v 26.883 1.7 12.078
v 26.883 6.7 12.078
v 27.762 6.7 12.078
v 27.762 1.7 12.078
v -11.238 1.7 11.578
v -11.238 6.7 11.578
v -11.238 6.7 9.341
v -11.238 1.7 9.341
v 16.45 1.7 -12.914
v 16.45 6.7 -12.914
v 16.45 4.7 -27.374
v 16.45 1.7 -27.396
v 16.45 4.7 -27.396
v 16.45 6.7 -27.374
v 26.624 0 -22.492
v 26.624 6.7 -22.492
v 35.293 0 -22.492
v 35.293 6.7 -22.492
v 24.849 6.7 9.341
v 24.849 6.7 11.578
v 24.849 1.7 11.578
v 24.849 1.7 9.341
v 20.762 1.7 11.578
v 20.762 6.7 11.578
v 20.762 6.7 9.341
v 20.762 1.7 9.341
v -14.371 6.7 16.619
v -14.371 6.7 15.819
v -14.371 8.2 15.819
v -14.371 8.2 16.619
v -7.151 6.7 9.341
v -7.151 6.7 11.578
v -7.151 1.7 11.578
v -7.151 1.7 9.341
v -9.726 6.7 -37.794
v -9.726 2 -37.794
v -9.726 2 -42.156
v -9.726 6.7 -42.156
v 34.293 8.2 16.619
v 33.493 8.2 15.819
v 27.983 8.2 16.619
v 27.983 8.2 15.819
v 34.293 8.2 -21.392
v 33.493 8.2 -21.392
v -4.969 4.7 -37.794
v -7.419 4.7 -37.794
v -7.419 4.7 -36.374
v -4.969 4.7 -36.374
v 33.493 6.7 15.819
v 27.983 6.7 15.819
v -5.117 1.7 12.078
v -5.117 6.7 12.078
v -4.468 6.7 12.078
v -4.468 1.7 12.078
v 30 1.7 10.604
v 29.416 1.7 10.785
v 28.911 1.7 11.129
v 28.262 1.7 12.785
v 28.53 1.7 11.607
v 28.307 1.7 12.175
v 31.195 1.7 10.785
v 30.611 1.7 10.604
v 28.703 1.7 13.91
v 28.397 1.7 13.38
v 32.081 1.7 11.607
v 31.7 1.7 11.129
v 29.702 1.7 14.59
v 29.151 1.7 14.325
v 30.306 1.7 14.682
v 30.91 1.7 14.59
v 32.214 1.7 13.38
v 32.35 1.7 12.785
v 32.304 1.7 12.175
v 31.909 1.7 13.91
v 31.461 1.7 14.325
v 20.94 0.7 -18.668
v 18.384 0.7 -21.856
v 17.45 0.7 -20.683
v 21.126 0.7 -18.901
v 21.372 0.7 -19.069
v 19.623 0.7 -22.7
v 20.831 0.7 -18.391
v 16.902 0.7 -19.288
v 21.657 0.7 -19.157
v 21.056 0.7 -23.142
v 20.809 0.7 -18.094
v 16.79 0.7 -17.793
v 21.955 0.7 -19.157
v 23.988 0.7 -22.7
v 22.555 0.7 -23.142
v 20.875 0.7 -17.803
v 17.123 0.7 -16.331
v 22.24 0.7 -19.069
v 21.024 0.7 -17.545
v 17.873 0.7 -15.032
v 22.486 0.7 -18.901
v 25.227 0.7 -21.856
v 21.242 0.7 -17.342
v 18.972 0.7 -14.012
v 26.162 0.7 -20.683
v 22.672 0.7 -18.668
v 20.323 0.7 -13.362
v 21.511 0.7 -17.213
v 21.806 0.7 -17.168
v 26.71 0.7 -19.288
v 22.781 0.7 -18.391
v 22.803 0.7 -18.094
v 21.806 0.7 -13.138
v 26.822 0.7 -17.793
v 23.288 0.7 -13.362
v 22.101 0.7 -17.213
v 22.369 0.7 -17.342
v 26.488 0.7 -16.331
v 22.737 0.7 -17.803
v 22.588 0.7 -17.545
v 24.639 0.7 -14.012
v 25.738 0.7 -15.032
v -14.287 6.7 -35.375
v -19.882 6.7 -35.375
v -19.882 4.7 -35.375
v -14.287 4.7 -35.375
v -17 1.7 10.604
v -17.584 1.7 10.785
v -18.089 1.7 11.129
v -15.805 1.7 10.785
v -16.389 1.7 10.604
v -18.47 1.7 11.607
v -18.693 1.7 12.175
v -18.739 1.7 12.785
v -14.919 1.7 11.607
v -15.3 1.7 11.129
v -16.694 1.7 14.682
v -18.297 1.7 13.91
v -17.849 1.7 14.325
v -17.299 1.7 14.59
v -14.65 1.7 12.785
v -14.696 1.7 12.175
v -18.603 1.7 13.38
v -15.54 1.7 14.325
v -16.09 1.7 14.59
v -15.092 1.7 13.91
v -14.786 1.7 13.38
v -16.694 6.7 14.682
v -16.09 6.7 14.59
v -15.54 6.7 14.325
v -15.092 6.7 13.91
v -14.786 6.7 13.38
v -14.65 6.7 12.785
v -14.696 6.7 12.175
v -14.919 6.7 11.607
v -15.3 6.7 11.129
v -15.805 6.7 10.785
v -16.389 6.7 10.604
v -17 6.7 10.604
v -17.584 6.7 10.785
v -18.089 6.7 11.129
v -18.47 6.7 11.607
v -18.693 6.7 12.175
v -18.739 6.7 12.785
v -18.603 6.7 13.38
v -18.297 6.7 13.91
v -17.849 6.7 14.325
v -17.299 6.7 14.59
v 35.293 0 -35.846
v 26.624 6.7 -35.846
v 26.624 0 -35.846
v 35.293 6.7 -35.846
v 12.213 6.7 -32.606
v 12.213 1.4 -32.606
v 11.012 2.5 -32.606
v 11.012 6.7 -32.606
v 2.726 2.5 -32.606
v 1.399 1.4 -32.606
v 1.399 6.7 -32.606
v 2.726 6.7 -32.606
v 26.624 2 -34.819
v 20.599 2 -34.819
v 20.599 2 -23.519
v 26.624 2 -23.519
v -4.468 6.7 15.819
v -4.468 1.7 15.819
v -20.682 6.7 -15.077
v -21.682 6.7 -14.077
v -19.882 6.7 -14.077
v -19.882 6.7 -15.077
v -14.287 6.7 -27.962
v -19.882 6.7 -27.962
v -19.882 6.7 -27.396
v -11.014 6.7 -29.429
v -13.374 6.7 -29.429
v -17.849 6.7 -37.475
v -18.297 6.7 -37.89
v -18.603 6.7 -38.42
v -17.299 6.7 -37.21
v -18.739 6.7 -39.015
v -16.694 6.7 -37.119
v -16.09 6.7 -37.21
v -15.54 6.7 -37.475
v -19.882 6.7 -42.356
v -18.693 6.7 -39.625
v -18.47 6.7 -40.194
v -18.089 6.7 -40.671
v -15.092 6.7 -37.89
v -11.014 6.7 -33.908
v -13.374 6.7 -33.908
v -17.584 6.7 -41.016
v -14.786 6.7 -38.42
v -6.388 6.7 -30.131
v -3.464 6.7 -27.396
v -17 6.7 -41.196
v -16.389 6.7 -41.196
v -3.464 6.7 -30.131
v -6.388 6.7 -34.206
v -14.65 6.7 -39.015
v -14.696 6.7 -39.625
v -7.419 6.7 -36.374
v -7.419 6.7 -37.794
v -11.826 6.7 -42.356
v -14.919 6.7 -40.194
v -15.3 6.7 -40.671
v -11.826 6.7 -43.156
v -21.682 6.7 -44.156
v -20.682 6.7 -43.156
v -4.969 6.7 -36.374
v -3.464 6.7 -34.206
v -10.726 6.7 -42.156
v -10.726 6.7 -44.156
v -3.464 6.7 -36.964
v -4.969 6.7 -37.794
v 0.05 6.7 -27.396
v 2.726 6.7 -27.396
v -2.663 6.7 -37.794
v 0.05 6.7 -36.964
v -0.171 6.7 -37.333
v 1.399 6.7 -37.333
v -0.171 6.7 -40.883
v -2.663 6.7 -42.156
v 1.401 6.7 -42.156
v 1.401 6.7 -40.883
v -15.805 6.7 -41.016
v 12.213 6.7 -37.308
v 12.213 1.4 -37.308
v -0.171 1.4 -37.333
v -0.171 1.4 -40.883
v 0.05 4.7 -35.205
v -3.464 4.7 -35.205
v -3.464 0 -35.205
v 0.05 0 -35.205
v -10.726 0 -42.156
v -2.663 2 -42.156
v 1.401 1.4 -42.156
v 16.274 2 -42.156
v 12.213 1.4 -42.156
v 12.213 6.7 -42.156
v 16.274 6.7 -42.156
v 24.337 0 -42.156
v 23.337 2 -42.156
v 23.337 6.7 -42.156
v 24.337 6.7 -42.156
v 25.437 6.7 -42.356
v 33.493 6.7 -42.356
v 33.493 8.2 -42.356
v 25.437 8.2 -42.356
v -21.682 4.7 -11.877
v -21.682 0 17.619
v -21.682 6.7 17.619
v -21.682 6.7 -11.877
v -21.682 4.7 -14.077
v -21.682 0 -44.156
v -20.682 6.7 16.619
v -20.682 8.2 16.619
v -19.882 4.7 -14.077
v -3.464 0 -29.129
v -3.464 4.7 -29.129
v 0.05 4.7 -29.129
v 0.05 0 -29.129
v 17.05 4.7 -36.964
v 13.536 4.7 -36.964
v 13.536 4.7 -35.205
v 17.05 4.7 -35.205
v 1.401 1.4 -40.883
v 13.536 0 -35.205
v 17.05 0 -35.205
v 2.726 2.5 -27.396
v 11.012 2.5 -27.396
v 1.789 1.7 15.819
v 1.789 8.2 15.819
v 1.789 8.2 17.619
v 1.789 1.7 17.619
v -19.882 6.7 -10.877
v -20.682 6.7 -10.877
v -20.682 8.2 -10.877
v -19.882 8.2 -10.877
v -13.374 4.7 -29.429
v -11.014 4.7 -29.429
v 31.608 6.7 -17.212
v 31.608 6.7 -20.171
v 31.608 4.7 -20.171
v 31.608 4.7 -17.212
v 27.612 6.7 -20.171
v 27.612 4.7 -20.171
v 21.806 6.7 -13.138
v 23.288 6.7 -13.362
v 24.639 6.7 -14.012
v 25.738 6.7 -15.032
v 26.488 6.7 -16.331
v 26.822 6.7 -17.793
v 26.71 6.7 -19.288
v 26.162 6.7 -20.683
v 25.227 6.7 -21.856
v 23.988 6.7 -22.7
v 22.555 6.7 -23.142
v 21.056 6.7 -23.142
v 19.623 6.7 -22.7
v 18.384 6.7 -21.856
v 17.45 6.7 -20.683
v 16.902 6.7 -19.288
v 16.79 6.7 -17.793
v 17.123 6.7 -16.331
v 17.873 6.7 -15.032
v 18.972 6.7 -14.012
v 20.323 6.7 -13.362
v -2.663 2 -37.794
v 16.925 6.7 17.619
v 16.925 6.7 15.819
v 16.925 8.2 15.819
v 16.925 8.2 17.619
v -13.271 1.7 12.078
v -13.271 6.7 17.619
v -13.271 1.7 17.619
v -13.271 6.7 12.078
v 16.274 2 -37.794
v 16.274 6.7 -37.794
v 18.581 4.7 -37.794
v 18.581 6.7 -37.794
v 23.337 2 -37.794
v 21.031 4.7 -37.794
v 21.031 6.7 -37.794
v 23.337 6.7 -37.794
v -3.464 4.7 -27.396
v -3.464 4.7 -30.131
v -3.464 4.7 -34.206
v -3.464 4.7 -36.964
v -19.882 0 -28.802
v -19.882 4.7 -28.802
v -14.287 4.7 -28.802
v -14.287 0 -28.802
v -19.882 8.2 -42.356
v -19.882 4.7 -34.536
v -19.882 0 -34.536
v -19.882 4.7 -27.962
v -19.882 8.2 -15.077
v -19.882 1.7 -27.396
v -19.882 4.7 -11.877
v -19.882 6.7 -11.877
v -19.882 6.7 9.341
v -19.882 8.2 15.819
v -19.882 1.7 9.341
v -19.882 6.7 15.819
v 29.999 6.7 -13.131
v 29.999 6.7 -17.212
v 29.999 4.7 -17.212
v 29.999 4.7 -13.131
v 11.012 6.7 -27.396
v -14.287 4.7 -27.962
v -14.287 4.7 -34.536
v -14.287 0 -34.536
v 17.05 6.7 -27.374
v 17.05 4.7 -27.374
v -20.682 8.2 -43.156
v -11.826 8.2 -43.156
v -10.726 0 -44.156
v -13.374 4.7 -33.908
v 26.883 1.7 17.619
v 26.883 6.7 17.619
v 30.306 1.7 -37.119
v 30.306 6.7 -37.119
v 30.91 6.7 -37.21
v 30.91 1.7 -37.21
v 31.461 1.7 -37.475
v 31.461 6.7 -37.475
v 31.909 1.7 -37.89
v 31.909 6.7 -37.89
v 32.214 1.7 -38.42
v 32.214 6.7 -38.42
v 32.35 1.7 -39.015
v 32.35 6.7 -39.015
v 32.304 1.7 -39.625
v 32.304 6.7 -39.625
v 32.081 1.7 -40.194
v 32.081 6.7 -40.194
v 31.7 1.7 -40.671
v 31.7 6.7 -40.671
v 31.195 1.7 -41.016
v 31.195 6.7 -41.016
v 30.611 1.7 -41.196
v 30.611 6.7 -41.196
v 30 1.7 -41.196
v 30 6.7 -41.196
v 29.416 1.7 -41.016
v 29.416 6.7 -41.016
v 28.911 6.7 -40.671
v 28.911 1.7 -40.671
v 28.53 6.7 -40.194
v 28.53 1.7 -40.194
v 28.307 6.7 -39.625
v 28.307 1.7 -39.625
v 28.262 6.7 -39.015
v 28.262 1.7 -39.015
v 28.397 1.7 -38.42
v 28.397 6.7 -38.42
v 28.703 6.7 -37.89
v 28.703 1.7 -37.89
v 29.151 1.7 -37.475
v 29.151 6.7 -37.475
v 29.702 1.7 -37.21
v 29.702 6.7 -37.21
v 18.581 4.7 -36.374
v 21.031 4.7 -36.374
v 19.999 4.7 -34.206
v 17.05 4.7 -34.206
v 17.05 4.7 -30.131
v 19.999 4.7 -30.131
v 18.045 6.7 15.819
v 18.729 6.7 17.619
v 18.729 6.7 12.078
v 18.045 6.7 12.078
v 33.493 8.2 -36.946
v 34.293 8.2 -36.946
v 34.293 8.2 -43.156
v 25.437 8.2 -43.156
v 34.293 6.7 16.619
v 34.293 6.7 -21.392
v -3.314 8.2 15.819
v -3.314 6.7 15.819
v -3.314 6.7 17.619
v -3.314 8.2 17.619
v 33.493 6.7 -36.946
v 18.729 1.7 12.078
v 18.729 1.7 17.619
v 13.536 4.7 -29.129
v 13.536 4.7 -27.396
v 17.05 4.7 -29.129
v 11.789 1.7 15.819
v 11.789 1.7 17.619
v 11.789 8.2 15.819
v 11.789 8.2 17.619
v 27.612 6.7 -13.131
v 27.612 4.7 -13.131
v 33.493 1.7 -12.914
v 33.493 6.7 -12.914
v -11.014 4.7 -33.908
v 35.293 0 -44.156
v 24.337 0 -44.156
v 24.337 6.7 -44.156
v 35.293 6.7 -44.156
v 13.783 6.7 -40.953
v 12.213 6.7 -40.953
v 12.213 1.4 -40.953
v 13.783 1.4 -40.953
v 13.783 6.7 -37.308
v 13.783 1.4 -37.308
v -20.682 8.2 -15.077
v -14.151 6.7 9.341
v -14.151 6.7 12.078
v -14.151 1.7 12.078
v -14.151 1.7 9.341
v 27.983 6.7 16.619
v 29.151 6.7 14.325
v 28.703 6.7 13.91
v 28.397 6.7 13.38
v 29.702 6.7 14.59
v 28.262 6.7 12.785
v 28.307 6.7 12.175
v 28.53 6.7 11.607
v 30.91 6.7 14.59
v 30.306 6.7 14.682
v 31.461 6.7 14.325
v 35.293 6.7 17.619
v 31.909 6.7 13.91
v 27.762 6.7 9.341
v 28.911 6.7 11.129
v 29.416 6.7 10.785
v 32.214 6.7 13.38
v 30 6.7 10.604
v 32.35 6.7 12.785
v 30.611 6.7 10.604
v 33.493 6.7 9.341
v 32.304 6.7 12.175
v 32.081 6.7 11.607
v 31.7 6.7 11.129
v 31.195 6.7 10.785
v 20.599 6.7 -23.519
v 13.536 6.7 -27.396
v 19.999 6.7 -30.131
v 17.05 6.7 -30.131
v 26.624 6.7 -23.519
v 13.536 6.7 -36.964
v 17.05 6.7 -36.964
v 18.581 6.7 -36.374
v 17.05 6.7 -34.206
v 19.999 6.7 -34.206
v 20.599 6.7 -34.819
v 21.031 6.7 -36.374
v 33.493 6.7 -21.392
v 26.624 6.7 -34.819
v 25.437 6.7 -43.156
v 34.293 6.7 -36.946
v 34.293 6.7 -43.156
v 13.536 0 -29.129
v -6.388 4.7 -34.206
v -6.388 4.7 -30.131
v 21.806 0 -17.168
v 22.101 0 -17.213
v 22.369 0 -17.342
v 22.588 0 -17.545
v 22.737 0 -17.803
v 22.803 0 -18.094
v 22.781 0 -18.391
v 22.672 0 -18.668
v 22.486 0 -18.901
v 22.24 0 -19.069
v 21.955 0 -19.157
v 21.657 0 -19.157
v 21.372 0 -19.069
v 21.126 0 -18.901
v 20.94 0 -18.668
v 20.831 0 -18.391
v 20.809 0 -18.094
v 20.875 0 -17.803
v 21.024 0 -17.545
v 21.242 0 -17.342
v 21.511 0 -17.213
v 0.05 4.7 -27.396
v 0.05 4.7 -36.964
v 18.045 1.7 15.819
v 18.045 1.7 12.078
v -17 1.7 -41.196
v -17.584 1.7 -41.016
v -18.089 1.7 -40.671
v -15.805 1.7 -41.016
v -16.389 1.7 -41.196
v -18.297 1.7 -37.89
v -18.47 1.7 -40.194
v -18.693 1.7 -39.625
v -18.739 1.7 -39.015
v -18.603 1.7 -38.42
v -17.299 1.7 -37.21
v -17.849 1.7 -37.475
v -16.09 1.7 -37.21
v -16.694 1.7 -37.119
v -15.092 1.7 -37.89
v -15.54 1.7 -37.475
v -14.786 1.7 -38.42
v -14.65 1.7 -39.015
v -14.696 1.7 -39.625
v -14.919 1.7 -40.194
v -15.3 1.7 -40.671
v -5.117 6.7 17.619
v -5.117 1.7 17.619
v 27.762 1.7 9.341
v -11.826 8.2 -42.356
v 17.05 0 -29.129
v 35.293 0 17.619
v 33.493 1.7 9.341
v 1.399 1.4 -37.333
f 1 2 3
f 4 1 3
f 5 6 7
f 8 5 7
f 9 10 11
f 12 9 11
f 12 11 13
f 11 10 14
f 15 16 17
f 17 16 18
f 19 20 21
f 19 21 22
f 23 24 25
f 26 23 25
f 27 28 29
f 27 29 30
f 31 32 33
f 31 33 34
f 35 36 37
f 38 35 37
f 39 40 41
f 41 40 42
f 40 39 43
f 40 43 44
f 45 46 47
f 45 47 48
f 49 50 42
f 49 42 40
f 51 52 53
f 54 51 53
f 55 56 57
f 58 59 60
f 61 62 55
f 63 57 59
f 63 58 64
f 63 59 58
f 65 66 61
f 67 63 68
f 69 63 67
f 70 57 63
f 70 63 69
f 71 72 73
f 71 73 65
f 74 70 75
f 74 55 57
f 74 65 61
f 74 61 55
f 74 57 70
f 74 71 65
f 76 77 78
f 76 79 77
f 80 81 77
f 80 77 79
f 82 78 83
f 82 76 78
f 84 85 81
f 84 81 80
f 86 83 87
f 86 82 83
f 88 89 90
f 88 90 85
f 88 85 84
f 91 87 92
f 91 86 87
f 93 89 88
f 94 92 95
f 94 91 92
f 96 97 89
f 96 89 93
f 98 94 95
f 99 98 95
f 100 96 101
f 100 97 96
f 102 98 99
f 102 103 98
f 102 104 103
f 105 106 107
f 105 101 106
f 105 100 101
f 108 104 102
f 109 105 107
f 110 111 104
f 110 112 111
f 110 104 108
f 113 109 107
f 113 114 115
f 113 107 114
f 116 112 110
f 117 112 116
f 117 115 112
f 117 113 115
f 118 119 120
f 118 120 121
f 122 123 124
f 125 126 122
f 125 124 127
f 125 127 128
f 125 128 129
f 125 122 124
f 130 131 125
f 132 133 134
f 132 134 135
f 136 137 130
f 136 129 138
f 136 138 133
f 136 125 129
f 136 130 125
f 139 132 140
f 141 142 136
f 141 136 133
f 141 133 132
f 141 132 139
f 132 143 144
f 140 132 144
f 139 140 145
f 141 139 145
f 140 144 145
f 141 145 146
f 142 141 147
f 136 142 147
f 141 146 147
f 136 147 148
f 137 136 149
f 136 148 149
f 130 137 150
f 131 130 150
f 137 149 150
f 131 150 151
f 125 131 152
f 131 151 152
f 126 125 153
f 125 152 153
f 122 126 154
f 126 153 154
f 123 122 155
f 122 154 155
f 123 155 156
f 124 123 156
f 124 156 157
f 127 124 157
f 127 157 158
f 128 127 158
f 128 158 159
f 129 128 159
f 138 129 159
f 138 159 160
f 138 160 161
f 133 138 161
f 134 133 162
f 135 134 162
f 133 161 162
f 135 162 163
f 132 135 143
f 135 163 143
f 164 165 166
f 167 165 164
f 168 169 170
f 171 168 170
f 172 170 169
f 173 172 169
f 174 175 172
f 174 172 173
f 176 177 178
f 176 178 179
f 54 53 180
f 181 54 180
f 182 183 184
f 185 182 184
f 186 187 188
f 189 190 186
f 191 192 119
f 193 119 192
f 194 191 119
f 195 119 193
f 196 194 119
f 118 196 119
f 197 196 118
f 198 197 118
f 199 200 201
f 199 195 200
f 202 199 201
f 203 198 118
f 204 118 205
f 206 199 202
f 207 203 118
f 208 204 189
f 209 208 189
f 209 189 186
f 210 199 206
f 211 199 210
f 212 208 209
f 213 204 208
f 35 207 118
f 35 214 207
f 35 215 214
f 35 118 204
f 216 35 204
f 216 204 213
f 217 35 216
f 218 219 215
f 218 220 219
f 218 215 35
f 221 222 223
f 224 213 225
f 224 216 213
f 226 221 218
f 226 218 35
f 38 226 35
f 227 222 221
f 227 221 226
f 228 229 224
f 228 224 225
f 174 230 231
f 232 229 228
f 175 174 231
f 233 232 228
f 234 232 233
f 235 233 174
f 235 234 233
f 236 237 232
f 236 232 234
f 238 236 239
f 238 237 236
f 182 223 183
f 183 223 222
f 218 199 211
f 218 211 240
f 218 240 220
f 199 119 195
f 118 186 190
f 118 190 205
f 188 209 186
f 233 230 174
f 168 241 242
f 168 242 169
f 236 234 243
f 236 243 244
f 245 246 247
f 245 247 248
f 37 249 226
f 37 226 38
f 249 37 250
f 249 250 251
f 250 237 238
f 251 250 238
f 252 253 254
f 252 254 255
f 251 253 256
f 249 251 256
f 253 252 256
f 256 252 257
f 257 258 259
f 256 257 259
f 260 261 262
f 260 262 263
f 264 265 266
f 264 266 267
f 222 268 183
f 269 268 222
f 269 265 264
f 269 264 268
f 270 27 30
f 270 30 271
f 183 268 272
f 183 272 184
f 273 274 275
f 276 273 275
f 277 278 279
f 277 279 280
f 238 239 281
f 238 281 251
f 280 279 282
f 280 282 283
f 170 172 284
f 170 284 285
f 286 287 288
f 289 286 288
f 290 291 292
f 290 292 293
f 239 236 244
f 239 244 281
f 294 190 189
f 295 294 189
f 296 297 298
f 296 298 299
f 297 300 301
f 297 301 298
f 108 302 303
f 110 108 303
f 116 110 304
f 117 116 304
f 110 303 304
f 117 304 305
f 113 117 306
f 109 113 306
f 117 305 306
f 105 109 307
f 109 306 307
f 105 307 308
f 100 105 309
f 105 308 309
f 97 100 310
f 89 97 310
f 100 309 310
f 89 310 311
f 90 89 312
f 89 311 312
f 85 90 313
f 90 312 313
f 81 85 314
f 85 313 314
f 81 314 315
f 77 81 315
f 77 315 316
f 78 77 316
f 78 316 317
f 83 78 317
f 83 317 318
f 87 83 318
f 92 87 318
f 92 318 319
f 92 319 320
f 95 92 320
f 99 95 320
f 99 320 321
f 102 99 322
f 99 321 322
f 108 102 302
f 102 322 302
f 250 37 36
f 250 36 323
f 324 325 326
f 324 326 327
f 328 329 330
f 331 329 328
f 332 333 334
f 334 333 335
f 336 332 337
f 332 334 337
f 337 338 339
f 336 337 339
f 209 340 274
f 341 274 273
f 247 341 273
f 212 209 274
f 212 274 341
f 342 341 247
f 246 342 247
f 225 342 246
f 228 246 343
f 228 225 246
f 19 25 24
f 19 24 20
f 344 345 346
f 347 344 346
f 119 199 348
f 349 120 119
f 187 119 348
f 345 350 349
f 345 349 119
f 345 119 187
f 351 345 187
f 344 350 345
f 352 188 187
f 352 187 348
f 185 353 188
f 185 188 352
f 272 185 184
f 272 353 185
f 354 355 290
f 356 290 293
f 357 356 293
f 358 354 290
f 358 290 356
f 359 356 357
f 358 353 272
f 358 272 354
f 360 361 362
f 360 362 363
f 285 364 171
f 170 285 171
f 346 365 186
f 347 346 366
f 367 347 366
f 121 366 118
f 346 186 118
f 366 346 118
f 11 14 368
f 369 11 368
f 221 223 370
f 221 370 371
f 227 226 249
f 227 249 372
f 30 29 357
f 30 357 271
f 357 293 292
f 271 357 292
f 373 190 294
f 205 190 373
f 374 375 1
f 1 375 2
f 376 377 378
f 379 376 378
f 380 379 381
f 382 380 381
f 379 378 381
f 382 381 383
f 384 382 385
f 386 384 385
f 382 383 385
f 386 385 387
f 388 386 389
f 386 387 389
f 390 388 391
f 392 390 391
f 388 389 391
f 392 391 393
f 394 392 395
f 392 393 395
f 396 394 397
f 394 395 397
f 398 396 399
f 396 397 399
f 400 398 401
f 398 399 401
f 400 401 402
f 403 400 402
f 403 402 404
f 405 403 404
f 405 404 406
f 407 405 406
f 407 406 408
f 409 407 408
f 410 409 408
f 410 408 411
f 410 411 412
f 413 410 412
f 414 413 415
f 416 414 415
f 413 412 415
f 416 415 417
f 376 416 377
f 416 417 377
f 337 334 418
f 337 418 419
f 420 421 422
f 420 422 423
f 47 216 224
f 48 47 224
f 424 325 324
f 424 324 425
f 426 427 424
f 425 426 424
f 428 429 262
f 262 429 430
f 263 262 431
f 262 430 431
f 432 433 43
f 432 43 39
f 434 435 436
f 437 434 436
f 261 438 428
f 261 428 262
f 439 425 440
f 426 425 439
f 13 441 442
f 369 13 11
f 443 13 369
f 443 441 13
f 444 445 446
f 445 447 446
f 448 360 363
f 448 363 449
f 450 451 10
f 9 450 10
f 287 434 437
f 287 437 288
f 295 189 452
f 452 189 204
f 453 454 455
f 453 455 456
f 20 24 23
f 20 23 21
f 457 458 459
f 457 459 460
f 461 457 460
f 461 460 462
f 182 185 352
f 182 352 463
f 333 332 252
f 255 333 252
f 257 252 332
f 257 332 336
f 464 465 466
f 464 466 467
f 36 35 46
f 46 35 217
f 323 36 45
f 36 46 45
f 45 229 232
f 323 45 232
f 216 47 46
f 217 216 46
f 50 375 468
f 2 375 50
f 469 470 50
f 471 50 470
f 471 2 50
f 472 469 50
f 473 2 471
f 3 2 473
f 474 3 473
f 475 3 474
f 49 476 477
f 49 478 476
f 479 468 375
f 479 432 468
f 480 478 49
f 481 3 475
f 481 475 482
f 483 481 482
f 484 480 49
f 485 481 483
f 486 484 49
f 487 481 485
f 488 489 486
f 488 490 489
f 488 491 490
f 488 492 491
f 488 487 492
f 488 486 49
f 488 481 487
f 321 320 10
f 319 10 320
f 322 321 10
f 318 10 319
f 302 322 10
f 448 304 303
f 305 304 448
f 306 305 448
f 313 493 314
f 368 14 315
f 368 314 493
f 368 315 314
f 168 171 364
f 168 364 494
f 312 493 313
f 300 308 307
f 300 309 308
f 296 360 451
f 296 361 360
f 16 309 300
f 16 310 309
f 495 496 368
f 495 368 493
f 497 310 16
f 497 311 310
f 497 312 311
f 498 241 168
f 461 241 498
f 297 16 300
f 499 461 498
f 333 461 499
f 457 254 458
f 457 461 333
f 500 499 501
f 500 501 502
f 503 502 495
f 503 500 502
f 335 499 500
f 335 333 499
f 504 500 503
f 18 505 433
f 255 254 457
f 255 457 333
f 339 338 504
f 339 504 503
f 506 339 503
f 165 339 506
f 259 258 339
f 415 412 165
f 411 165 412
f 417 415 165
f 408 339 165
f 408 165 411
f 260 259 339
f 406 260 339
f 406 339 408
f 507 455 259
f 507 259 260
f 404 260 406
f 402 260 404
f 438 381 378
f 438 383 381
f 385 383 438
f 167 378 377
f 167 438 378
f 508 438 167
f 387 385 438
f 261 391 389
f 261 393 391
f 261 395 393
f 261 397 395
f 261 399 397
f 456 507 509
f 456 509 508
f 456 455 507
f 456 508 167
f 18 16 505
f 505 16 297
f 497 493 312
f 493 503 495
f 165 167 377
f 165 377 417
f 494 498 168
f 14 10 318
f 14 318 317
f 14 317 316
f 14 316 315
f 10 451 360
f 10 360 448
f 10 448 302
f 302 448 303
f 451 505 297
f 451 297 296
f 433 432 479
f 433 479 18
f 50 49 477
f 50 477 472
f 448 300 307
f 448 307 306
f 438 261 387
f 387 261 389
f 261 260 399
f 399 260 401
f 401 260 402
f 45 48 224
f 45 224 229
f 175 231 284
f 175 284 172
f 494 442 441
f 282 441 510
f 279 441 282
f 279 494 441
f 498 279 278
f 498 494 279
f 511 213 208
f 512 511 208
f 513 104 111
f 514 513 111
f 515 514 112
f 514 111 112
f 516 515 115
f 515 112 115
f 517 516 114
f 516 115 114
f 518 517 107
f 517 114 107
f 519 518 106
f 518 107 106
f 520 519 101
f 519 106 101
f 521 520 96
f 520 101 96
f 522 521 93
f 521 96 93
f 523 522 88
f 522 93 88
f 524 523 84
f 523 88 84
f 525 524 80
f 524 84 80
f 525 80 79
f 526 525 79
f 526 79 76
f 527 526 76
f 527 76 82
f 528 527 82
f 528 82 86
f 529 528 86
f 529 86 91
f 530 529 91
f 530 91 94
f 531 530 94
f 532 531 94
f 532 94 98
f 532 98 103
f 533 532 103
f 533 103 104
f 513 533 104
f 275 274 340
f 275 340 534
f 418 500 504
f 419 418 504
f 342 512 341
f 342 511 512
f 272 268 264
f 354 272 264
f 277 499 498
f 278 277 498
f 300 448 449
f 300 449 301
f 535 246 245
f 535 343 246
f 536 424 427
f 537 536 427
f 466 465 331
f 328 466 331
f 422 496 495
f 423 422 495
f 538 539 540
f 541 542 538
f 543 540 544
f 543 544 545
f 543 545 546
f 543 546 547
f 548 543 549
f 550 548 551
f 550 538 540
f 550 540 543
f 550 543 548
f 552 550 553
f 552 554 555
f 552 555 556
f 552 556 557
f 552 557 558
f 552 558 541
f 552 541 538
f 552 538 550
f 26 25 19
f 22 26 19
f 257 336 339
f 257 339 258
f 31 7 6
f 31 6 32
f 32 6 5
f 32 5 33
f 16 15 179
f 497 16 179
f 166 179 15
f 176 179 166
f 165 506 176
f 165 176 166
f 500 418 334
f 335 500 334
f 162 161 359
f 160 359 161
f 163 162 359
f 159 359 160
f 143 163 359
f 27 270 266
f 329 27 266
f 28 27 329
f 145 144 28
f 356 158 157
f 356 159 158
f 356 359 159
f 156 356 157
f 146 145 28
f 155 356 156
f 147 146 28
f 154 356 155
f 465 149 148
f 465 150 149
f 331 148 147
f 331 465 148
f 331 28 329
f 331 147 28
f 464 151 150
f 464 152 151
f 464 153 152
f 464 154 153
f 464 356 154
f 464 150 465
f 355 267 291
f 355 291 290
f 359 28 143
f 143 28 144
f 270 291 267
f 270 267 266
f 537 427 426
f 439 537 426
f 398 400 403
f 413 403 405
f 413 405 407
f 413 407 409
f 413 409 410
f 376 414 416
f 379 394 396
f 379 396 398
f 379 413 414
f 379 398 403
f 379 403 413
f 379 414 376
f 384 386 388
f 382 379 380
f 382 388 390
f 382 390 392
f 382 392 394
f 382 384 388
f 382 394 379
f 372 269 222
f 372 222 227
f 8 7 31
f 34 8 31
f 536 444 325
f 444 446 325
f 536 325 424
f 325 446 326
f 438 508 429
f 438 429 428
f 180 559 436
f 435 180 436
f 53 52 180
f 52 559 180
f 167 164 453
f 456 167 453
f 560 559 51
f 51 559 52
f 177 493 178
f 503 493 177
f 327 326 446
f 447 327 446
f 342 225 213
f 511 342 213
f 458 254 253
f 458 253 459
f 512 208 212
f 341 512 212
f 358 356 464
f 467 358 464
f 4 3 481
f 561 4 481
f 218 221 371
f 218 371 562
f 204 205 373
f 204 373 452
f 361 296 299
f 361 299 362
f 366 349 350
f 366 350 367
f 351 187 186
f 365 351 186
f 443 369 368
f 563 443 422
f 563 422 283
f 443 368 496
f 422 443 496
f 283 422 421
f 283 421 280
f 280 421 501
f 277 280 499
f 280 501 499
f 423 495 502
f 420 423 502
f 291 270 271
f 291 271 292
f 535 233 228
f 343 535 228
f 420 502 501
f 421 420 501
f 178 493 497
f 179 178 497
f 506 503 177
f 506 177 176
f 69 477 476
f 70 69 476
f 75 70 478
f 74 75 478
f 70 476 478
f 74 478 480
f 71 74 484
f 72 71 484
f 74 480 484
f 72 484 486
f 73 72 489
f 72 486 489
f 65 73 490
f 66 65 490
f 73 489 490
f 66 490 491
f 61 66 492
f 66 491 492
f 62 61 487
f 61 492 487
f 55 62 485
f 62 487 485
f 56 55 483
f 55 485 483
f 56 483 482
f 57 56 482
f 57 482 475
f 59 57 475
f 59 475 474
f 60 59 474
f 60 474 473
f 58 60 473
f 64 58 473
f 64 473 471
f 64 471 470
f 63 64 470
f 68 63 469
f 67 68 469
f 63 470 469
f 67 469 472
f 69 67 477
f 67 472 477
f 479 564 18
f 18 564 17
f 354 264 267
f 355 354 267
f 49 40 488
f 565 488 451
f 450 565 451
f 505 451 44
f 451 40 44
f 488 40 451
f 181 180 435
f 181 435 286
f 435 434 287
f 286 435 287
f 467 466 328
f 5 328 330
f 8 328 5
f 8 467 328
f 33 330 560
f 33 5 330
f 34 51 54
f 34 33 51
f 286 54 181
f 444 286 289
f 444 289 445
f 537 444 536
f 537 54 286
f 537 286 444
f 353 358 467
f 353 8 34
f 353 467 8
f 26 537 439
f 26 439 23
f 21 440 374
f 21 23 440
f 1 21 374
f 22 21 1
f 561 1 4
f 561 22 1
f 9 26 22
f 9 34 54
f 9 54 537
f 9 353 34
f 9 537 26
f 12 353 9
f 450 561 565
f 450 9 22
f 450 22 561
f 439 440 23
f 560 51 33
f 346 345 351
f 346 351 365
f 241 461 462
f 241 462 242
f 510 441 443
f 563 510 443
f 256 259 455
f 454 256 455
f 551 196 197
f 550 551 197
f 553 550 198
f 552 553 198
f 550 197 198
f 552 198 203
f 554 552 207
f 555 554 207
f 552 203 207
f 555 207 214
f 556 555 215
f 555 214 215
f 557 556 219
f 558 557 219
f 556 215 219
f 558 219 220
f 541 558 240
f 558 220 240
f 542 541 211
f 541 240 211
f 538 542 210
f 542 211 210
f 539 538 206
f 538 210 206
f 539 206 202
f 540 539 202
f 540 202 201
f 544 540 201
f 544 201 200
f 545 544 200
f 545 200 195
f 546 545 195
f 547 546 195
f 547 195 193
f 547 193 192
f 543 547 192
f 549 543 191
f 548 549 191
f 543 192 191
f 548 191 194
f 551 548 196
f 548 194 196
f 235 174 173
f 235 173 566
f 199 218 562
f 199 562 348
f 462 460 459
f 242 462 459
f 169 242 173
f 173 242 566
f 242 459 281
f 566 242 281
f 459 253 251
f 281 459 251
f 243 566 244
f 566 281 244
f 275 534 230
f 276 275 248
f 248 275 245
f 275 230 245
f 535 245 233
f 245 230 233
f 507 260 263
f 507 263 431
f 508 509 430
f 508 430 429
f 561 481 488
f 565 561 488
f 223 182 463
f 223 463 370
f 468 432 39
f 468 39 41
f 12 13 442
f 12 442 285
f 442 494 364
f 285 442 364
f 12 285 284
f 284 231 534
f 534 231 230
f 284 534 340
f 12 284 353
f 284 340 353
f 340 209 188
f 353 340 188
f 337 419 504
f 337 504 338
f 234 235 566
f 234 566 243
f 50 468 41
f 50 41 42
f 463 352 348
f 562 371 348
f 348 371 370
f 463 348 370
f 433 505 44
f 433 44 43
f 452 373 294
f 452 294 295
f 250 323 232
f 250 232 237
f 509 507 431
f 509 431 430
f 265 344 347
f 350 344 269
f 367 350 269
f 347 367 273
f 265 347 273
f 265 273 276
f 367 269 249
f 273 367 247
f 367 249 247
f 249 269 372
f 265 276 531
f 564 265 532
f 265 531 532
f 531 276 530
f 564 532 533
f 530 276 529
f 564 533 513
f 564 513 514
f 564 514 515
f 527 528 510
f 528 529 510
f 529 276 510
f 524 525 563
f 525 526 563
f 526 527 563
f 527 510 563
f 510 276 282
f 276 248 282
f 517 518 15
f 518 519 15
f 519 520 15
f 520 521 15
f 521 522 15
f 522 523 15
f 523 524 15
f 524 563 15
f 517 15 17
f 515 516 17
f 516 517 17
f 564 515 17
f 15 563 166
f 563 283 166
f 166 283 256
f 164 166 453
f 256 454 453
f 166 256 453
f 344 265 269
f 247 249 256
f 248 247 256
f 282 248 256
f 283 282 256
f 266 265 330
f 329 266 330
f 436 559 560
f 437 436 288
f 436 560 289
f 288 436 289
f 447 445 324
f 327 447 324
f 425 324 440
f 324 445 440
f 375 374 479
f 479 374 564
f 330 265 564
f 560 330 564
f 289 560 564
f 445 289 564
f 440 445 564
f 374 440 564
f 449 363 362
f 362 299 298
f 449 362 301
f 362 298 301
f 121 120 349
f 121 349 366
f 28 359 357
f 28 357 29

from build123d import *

# Parameters (mm, degrees)
SKETCH_1_W           = 56.974706629
SKETCH_1_H           = 61.774716789
EXTRUDE_1_DEPTH      = 6.7
SKETCH_2_W           = 8.669316727
SKETCH_2_H           = 13.354025908
CUT_EXTRUDE_1_DEPTH  = 57.923066884
SKETCH_3_W           = 6.025008901
SKETCH_3_H           = 11.3000508
CUT_EXTRUDE_2_DEPTH  = 4.7
SKETCH_4_R           = 5.03
CUT_EXTRUDE_3_DEPTH  = 6
SKETCH_5_R           = 1
CUT_EXTRUDE_4_DEPTH  = 57.923066884
CUT_EXTRUDE_5_DEPTH  = 2
CUT_EXTRUDE_6_DEPTH  = 2
SKETCH_8_W           = 3.513995428
SKETCH_8_H           = 6.075560276
CUT_EXTRUDE_7_DEPTH  = 57.923066884
SKETCH_9_W           = 7.063042926
SKETCH_9_H           = 4.362369824
CUT_EXTRUDE_8_DEPTH  = 4.7
SKETCH_10_W          = 2.4499365
SKETCH_10_H          = 1.42002794
CUT_EXTRUDE_9_DEPTH  = 2
SKETCH_11_W          = 35.063093726
SKETCH_11_H          = 2
CUT_EXTRUDE_10_DEPTH = 57.923066884
CUT_EXTRUDE_11_DEPTH = 5.3
SKETCH_13_W          = 8.286080772
SKETCH_13_H          = 5.236537973
CUT_EXTRUDE_12_DEPTH = 4.2
SKETCH_14_W          = 2.359613919
SKETCH_14_H          = 4.479603759
SKETCH_14_W_2        = 5.594310389
SKETCH_14_H_2        = 7.413106427
CUT_EXTRUDE_13_DEPTH = 2
SKETCH_15_W          = 5.594310389
SKETCH_15_H          = 5.734010668
CUT_EXTRUDE_14_DEPTH = 57.923066884
CUT_EXTRUDE_15_DEPTH = 5
SKETCH_18_W          = 8.154025908
SKETCH_18_H          = 6.040749301
CUT_EXTRUDE_16_DEPTH = 5
SKETCH_19_W          = 2.683012447
SKETCH_19_H          = 2.737564136
SKETCH_19_W_2        = 2.913081027
SKETCH_19_W_3        = 2.717012954
SKETCH_19_H_2        = 2.737561596
SKETCH_19_W_4        = 2.913081026
CUT_EXTRUDE_17_DEPTH = 5
EXTRUDE_4_DEPTH      = 1.5
SKETCH_25_R          = 2.05
CUT_EXTRUDE_18_DEPTH = 5
CUT_EXTRUDE_19_REACH = 74.547
SKETCH_26_W          = 2.2
SKETCH_26_H          = 2


with BuildPart() as part:
    # 草图1 → 凸台-拉伸1 (new body)
    with BuildSketch(Plane(origin=(0, 0, 0), x_dir=(1, 0, 0), z_dir=(0, 1, 0))):
        with Locations((6.805733636, 13.268542196)):
            Rectangle(SKETCH_1_W, SKETCH_1_H)
    extrude(amount=EXTRUDE_1_DEPTH)

    # 草图2 → 切除-拉伸1 (cut, through all)
    with BuildSketch(Plane(origin=(0, 6.7, 0), x_dir=(1, 0, 0), z_dir=(0, 1, 0))):
        with Locations((30.958428588, 29.168521876)):
            Rectangle(SKETCH_2_W, SKETCH_2_H)
    extrude(amount=-CUT_EXTRUDE_1_DEPTH, mode=Mode.SUBTRACT)

    # 草图3 → 切除-拉伸2 (cut)
    with BuildSketch(Plane(origin=(0, 6.7, 0), x_dir=(1, 0, 0), z_dir=(0, 1, 0))):
        with Locations((23.611265774, 29.168534576)):
            Rectangle(SKETCH_3_W, SKETCH_3_H)
    extrude(amount=-CUT_EXTRUDE_2_DEPTH, mode=Mode.SUBTRACT)

    # 草图4 → 切除-拉伸3 (cut)
    with BuildSketch(Plane(origin=(0, 6.7, 0), x_dir=(1, 0, 0), z_dir=(0, 1, 0))):
        with Locations(Location((21.805764117, 18.168422815, 0), (0, 0, 270))):
            Circle(SKETCH_4_R)
    extrude(amount=-CUT_EXTRUDE_3_DEPTH, mode=Mode.SUBTRACT)

    # 草图5 → 切除-拉伸4 (cut, through all)
    with BuildSketch(Plane(origin=(0, 6.7, 0), x_dir=(1, 0, 0), z_dir=(0, 1, 0))):
        with Locations(Location((21.805764117, 18.168422815, 0), (0, 0, 270))):
            Circle(SKETCH_5_R)
    extrude(amount=-CUT_EXTRUDE_4_DEPTH, mode=Mode.SUBTRACT)

    # 草图6 → 切除-拉伸5 (cut)
    with BuildSketch(Plane(origin=(0, 6.7, 0), x_dir=(1, 0, 0), z_dir=(0, 1, 0))):
        Polygon((29.999071203, 13.131206661), (27.61248243, 13.131206661), (27.61248243, 20.17096536), (31.608192362, 20.17096536), (31.608192362, 17.212011843), (29.999071203, 17.212011843), align=None)
    extrude(amount=-CUT_EXTRUDE_5_DEPTH, mode=Mode.SUBTRACT)

    # 草图7 → 切除-拉伸6 (cut)
    with BuildSketch(Plane(origin=(0, 6.7, 0), x_dir=(1, 0, 0), z_dir=(0, 1, 0))):
        Polygon((13.535748877, 27.373568866), (17.049744305, 27.373568866), (17.049744305, 30.131239681), (19.999050883, 30.131239681), (19.999050883, 34.20591583), (17.049744305, 34.20591583), (17.049744305, 36.963586646), (13.535748877, 36.963586646), align=None)
        Polygon((0.049708745, 27.373568866), (0.049708745, 36.963586646), (-3.464286683, 36.963586646), (-3.464286683, 34.20591583), (-6.38758361, 34.20591583), (-6.38758361, 30.131239681), (-3.464286683, 30.131239681), (-3.464286683, 27.373568866), align=None)
    extrude(amount=-CUT_EXTRUDE_6_DEPTH, mode=Mode.SUBTRACT)

    # 草图8 → 切除-拉伸7 (cut, through all)
    with BuildSketch(Plane(origin=(0, 6.7, 0), x_dir=(1, 0, 0), z_dir=(0, 1, 0))):
        with Locations((15.292746591, 32.16678949)):
            Rectangle(SKETCH_8_W, SKETCH_8_H)
        with Locations((-1.707288969, 32.16678949)):
            Rectangle(SKETCH_8_W, SKETCH_8_H)
    extrude(amount=-CUT_EXTRUDE_7_DEPTH, mode=Mode.SUBTRACT)

    # 草图9 → 切除-拉伸8 (cut)
    with BuildSketch(Plane(origin=(0, 6.7, 0), x_dir=(1, 0, 0), z_dir=(0, 1, 0))):
        with Locations((19.805886037, 39.974715678)):
            Rectangle(SKETCH_9_W, SKETCH_9_H)
        with Locations((-6.194164763, 39.974715678)):
            Rectangle(SKETCH_9_W, SKETCH_9_H)
    extrude(amount=-CUT_EXTRUDE_8_DEPTH, mode=Mode.SUBTRACT)

    # 草图10 → 切除-拉伸9 (cut)
    with BuildSketch(Plane(origin=(0, 6.7, 0), x_dir=(1, 0, 0), z_dir=(0, 1, 0))):
        with Locations((19.805759037, 37.083516796)):
            Rectangle(SKETCH_10_W, SKETCH_10_H)
        with Locations((-6.194291763, 37.083516796)):
            Rectangle(SKETCH_10_W, SKETCH_10_H)
    extrude(amount=-CUT_EXTRUDE_9_DEPTH, mode=Mode.SUBTRACT)

    # 草图11 → 切除-拉伸10 (cut, through all)
    with BuildSketch(Plane(origin=(0, 6.7, 0), x_dir=(1, 0, 0), z_dir=(0, 1, 0))):
        with Locations((6.805860637, 43.15590059)):
            Rectangle(SKETCH_11_W, SKETCH_11_H)
    extrude(amount=-CUT_EXTRUDE_10_DEPTH, mode=Mode.SUBTRACT)

    # 草图12 → 切除-拉伸11 (cut)
    with BuildSketch(Plane(origin=(0, 6.7, 0), x_dir=(1, 0, 0), z_dir=(0, 1, 0))):
        Polygon((12.21261705, 42.15590059), (12.21261705, 40.952697644), (13.78261959, 40.952697644), (13.78261959, 37.307917354), (12.21261705, 37.307917354), (12.21261705, 32.60558055), (1.398596223, 32.60558055), (1.398596223, 37.333317405), (-0.171406318, 37.333317405), (-0.171406318, 40.882923704), (1.400885865, 40.882923704), (1.400885865, 42.15590059), align=None)
    extrude(amount=-CUT_EXTRUDE_11_DEPTH, mode=Mode.SUBTRACT)

    # 草图13 → 切除-拉伸12 (cut)
    with BuildSketch(Plane(origin=(0, 6.7, 0), x_dir=(1, 0, 0), z_dir=(0, 1, 0))):
        with Locations((6.869233764, 29.987311564)):
            Rectangle(SKETCH_13_W, SKETCH_13_H)
    extrude(amount=-CUT_EXTRUDE_12_DEPTH, mode=Mode.SUBTRACT)

    # 草图14 → 切除-拉伸13 (cut)
    with BuildSketch(Plane(origin=(0, 6.7, 0), x_dir=(1, 0, 0), z_dir=(0, 1, 0))):
        with Locations((-12.194304463, 31.668577756)):
            Rectangle(SKETCH_14_W, SKETCH_14_H)
        with Locations((-17.084464483, 31.668577756)):
            Rectangle(SKETCH_14_W_2, SKETCH_14_H_2)
    extrude(amount=-CUT_EXTRUDE_13_DEPTH, mode=Mode.SUBTRACT)

    # 草图15 → 切除-拉伸14 (cut, through all)
    with BuildSketch(Plane(origin=(0, 6.7, 0), x_dir=(1, 0, 0), z_dir=(0, 1, 0))):
        with Locations((-17.084464483, 31.668653956)):
            Rectangle(SKETCH_15_W, SKETCH_15_H)
    extrude(amount=-CUT_EXTRUDE_14_DEPTH, mode=Mode.SUBTRACT)

    # 草图16 → 切除-拉伸15 (cut)
    with BuildSketch(Plane(origin=(0, 6.7, 0), x_dir=(1, 0, 0), z_dir=(0, 1, 0))):
        Polygon((16.449751925, 27.39556785), (-19.881619678, 27.39556785), (-19.881619678, -9.340502762), (-4.46782745, -9.340502762), (-4.46782745, -15.818816199), (1.788733383, -15.818816199), (1.788733383, -17.618816199), (11.788733383, -17.618816199), (11.788733383, -15.818816199), (18.045294216, -15.818816199), (18.045294216, -9.340505302), (33.493086951, -9.340505302), (33.493086951, 12.913538386), (16.449751925, 12.913538386), align=None)
    extrude(amount=-CUT_EXTRUDE_15_DEPTH, mode=Mode.SUBTRACT)

    # 草图18 → 切除-拉伸16 (cut)
    with BuildSketch(Plane(origin=(0, 6.7, 0), x_dir=(1, 0, 0), z_dir=(0, 1, 0))):
        with Locations((-9.194172383, -14.598441549)):
            Rectangle(SKETCH_18_W, SKETCH_18_H)
        with Locations((22.805893657, -14.598441549)):
            Rectangle(SKETCH_18_W, SKETCH_18_H)
    extrude(amount=-CUT_EXTRUDE_16_DEPTH, mode=Mode.SUBTRACT)

    # 草图19 → 切除-拉伸17 (cut)
    with BuildSketch(Plane(origin=(0, 6.7, 0), x_dir=(1, 0, 0), z_dir=(0, 1, 0))):
        with Locations((-5.809333674, -10.70928483)):
            Rectangle(SKETCH_19_W, SKETCH_19_H)
        with Locations((-12.694299384, -10.70928483)):
            Rectangle(SKETCH_19_W_2, SKETCH_19_H)
        with Locations((19.403800693, -10.7092861)):
            Rectangle(SKETCH_19_W_3, SKETCH_19_H_2)
        with Locations((26.305766657, -10.7092861)):
            Rectangle(SKETCH_19_W_4, SKETCH_19_H_2)
    extrude(amount=-CUT_EXTRUDE_17_DEPTH, mode=Mode.SUBTRACT)

    # 草图24 → 凸台-拉伸4 (add)
    with BuildSketch(Plane(origin=(0, 6.7, 0), x_dir=(1, 0, 0), z_dir=(0, 1, 0))):
        Polygon((-11.825686226, 42.35590059), (-19.881619678, 42.35590059), (-19.881619678, 15.076541942), (-20.681619678, 15.076541942), (-20.681619678, 43.15590059), (-11.825686226, 43.15590059), align=None)
        Polygon((-19.881619678, -15.818816199), (-14.371185337, -15.818816199), (-14.371185337, -16.618816199), (-20.681619678, -16.618816199), (-20.681619678, 10.876541942), (-19.881619678, 10.876541942), align=None)
        Polygon((33.493086951, -15.818816199), (33.493086951, 21.391508922), (34.293086951, 21.391508922), (34.293086951, -16.618816199), (27.982906611, -16.618816199), (27.982906611, -15.818816199), align=None)
        Polygon((33.493086951, 36.94553483), (33.493086951, 42.35590059), (25.4374075, 42.35590059), (25.4374075, 43.15590059), (34.293086951, 43.15590059), (34.293086951, 36.94553483), align=None)
        Polygon((1.788733383, -16.618816199), (1.788733383, -15.818816199), (-3.313915843, -15.818816199), (-3.313915843, -17.618816199), (1.788733383, -17.618816199), align=None)
        Polygon((11.788733383, -16.618816199), (11.788733383, -15.818816199), (16.925383116, -15.818816199), (16.925383116, -17.618816199), (11.788733383, -17.618816199), align=None)
    extrude(amount=EXTRUDE_4_DEPTH)

    # 草图25 → 切除-拉伸18 (cut)
    with BuildSketch(Plane(origin=(0, 6.7, 0), x_dir=(1, 0, 0), z_dir=(0, 1, 0))):
        with Locations(Location((30.305781897, -12.631511144, 0), (0, 0, 270))):
            Circle(SKETCH_25_R)
        with Locations(Location((-16.694314623, 39.168592996, 0), (0, 0, 270))):
            Circle(SKETCH_25_R)
        with Locations(Location((-16.694314623, -12.631511144, 0), (0, 0, 270))):
            Circle(SKETCH_25_R)
        with Locations(Location((30.305781897, 39.168592996, 0), (0, 0, 270))):
            Circle(SKETCH_25_R)
    extrude(amount=-CUT_EXTRUDE_18_DEPTH, mode=Mode.SUBTRACT)

    # 草图26 → 切除-拉伸19 (cut, up to next)
    with BuildSketch(Plane.ZY.offset(21.681619678), mode=Mode.PRIVATE) as cut_extrude_19_sk1:
        with Locations((-12.976541942, 5.7)):
            Rectangle(SKETCH_26_W, SKETCH_26_H)
    cut_extrude_19_tool1 = extrude(cut_extrude_19_sk1.sketch, amount=-CUT_EXTRUDE_19_REACH, mode=Mode.PRIVATE) & part.part
    add(cut_extrude_19_tool1.solids().sort_by_distance((-21.68162, 5.7, -12.976542))[0], mode=Mode.SUBTRACT)


solid = part.part
